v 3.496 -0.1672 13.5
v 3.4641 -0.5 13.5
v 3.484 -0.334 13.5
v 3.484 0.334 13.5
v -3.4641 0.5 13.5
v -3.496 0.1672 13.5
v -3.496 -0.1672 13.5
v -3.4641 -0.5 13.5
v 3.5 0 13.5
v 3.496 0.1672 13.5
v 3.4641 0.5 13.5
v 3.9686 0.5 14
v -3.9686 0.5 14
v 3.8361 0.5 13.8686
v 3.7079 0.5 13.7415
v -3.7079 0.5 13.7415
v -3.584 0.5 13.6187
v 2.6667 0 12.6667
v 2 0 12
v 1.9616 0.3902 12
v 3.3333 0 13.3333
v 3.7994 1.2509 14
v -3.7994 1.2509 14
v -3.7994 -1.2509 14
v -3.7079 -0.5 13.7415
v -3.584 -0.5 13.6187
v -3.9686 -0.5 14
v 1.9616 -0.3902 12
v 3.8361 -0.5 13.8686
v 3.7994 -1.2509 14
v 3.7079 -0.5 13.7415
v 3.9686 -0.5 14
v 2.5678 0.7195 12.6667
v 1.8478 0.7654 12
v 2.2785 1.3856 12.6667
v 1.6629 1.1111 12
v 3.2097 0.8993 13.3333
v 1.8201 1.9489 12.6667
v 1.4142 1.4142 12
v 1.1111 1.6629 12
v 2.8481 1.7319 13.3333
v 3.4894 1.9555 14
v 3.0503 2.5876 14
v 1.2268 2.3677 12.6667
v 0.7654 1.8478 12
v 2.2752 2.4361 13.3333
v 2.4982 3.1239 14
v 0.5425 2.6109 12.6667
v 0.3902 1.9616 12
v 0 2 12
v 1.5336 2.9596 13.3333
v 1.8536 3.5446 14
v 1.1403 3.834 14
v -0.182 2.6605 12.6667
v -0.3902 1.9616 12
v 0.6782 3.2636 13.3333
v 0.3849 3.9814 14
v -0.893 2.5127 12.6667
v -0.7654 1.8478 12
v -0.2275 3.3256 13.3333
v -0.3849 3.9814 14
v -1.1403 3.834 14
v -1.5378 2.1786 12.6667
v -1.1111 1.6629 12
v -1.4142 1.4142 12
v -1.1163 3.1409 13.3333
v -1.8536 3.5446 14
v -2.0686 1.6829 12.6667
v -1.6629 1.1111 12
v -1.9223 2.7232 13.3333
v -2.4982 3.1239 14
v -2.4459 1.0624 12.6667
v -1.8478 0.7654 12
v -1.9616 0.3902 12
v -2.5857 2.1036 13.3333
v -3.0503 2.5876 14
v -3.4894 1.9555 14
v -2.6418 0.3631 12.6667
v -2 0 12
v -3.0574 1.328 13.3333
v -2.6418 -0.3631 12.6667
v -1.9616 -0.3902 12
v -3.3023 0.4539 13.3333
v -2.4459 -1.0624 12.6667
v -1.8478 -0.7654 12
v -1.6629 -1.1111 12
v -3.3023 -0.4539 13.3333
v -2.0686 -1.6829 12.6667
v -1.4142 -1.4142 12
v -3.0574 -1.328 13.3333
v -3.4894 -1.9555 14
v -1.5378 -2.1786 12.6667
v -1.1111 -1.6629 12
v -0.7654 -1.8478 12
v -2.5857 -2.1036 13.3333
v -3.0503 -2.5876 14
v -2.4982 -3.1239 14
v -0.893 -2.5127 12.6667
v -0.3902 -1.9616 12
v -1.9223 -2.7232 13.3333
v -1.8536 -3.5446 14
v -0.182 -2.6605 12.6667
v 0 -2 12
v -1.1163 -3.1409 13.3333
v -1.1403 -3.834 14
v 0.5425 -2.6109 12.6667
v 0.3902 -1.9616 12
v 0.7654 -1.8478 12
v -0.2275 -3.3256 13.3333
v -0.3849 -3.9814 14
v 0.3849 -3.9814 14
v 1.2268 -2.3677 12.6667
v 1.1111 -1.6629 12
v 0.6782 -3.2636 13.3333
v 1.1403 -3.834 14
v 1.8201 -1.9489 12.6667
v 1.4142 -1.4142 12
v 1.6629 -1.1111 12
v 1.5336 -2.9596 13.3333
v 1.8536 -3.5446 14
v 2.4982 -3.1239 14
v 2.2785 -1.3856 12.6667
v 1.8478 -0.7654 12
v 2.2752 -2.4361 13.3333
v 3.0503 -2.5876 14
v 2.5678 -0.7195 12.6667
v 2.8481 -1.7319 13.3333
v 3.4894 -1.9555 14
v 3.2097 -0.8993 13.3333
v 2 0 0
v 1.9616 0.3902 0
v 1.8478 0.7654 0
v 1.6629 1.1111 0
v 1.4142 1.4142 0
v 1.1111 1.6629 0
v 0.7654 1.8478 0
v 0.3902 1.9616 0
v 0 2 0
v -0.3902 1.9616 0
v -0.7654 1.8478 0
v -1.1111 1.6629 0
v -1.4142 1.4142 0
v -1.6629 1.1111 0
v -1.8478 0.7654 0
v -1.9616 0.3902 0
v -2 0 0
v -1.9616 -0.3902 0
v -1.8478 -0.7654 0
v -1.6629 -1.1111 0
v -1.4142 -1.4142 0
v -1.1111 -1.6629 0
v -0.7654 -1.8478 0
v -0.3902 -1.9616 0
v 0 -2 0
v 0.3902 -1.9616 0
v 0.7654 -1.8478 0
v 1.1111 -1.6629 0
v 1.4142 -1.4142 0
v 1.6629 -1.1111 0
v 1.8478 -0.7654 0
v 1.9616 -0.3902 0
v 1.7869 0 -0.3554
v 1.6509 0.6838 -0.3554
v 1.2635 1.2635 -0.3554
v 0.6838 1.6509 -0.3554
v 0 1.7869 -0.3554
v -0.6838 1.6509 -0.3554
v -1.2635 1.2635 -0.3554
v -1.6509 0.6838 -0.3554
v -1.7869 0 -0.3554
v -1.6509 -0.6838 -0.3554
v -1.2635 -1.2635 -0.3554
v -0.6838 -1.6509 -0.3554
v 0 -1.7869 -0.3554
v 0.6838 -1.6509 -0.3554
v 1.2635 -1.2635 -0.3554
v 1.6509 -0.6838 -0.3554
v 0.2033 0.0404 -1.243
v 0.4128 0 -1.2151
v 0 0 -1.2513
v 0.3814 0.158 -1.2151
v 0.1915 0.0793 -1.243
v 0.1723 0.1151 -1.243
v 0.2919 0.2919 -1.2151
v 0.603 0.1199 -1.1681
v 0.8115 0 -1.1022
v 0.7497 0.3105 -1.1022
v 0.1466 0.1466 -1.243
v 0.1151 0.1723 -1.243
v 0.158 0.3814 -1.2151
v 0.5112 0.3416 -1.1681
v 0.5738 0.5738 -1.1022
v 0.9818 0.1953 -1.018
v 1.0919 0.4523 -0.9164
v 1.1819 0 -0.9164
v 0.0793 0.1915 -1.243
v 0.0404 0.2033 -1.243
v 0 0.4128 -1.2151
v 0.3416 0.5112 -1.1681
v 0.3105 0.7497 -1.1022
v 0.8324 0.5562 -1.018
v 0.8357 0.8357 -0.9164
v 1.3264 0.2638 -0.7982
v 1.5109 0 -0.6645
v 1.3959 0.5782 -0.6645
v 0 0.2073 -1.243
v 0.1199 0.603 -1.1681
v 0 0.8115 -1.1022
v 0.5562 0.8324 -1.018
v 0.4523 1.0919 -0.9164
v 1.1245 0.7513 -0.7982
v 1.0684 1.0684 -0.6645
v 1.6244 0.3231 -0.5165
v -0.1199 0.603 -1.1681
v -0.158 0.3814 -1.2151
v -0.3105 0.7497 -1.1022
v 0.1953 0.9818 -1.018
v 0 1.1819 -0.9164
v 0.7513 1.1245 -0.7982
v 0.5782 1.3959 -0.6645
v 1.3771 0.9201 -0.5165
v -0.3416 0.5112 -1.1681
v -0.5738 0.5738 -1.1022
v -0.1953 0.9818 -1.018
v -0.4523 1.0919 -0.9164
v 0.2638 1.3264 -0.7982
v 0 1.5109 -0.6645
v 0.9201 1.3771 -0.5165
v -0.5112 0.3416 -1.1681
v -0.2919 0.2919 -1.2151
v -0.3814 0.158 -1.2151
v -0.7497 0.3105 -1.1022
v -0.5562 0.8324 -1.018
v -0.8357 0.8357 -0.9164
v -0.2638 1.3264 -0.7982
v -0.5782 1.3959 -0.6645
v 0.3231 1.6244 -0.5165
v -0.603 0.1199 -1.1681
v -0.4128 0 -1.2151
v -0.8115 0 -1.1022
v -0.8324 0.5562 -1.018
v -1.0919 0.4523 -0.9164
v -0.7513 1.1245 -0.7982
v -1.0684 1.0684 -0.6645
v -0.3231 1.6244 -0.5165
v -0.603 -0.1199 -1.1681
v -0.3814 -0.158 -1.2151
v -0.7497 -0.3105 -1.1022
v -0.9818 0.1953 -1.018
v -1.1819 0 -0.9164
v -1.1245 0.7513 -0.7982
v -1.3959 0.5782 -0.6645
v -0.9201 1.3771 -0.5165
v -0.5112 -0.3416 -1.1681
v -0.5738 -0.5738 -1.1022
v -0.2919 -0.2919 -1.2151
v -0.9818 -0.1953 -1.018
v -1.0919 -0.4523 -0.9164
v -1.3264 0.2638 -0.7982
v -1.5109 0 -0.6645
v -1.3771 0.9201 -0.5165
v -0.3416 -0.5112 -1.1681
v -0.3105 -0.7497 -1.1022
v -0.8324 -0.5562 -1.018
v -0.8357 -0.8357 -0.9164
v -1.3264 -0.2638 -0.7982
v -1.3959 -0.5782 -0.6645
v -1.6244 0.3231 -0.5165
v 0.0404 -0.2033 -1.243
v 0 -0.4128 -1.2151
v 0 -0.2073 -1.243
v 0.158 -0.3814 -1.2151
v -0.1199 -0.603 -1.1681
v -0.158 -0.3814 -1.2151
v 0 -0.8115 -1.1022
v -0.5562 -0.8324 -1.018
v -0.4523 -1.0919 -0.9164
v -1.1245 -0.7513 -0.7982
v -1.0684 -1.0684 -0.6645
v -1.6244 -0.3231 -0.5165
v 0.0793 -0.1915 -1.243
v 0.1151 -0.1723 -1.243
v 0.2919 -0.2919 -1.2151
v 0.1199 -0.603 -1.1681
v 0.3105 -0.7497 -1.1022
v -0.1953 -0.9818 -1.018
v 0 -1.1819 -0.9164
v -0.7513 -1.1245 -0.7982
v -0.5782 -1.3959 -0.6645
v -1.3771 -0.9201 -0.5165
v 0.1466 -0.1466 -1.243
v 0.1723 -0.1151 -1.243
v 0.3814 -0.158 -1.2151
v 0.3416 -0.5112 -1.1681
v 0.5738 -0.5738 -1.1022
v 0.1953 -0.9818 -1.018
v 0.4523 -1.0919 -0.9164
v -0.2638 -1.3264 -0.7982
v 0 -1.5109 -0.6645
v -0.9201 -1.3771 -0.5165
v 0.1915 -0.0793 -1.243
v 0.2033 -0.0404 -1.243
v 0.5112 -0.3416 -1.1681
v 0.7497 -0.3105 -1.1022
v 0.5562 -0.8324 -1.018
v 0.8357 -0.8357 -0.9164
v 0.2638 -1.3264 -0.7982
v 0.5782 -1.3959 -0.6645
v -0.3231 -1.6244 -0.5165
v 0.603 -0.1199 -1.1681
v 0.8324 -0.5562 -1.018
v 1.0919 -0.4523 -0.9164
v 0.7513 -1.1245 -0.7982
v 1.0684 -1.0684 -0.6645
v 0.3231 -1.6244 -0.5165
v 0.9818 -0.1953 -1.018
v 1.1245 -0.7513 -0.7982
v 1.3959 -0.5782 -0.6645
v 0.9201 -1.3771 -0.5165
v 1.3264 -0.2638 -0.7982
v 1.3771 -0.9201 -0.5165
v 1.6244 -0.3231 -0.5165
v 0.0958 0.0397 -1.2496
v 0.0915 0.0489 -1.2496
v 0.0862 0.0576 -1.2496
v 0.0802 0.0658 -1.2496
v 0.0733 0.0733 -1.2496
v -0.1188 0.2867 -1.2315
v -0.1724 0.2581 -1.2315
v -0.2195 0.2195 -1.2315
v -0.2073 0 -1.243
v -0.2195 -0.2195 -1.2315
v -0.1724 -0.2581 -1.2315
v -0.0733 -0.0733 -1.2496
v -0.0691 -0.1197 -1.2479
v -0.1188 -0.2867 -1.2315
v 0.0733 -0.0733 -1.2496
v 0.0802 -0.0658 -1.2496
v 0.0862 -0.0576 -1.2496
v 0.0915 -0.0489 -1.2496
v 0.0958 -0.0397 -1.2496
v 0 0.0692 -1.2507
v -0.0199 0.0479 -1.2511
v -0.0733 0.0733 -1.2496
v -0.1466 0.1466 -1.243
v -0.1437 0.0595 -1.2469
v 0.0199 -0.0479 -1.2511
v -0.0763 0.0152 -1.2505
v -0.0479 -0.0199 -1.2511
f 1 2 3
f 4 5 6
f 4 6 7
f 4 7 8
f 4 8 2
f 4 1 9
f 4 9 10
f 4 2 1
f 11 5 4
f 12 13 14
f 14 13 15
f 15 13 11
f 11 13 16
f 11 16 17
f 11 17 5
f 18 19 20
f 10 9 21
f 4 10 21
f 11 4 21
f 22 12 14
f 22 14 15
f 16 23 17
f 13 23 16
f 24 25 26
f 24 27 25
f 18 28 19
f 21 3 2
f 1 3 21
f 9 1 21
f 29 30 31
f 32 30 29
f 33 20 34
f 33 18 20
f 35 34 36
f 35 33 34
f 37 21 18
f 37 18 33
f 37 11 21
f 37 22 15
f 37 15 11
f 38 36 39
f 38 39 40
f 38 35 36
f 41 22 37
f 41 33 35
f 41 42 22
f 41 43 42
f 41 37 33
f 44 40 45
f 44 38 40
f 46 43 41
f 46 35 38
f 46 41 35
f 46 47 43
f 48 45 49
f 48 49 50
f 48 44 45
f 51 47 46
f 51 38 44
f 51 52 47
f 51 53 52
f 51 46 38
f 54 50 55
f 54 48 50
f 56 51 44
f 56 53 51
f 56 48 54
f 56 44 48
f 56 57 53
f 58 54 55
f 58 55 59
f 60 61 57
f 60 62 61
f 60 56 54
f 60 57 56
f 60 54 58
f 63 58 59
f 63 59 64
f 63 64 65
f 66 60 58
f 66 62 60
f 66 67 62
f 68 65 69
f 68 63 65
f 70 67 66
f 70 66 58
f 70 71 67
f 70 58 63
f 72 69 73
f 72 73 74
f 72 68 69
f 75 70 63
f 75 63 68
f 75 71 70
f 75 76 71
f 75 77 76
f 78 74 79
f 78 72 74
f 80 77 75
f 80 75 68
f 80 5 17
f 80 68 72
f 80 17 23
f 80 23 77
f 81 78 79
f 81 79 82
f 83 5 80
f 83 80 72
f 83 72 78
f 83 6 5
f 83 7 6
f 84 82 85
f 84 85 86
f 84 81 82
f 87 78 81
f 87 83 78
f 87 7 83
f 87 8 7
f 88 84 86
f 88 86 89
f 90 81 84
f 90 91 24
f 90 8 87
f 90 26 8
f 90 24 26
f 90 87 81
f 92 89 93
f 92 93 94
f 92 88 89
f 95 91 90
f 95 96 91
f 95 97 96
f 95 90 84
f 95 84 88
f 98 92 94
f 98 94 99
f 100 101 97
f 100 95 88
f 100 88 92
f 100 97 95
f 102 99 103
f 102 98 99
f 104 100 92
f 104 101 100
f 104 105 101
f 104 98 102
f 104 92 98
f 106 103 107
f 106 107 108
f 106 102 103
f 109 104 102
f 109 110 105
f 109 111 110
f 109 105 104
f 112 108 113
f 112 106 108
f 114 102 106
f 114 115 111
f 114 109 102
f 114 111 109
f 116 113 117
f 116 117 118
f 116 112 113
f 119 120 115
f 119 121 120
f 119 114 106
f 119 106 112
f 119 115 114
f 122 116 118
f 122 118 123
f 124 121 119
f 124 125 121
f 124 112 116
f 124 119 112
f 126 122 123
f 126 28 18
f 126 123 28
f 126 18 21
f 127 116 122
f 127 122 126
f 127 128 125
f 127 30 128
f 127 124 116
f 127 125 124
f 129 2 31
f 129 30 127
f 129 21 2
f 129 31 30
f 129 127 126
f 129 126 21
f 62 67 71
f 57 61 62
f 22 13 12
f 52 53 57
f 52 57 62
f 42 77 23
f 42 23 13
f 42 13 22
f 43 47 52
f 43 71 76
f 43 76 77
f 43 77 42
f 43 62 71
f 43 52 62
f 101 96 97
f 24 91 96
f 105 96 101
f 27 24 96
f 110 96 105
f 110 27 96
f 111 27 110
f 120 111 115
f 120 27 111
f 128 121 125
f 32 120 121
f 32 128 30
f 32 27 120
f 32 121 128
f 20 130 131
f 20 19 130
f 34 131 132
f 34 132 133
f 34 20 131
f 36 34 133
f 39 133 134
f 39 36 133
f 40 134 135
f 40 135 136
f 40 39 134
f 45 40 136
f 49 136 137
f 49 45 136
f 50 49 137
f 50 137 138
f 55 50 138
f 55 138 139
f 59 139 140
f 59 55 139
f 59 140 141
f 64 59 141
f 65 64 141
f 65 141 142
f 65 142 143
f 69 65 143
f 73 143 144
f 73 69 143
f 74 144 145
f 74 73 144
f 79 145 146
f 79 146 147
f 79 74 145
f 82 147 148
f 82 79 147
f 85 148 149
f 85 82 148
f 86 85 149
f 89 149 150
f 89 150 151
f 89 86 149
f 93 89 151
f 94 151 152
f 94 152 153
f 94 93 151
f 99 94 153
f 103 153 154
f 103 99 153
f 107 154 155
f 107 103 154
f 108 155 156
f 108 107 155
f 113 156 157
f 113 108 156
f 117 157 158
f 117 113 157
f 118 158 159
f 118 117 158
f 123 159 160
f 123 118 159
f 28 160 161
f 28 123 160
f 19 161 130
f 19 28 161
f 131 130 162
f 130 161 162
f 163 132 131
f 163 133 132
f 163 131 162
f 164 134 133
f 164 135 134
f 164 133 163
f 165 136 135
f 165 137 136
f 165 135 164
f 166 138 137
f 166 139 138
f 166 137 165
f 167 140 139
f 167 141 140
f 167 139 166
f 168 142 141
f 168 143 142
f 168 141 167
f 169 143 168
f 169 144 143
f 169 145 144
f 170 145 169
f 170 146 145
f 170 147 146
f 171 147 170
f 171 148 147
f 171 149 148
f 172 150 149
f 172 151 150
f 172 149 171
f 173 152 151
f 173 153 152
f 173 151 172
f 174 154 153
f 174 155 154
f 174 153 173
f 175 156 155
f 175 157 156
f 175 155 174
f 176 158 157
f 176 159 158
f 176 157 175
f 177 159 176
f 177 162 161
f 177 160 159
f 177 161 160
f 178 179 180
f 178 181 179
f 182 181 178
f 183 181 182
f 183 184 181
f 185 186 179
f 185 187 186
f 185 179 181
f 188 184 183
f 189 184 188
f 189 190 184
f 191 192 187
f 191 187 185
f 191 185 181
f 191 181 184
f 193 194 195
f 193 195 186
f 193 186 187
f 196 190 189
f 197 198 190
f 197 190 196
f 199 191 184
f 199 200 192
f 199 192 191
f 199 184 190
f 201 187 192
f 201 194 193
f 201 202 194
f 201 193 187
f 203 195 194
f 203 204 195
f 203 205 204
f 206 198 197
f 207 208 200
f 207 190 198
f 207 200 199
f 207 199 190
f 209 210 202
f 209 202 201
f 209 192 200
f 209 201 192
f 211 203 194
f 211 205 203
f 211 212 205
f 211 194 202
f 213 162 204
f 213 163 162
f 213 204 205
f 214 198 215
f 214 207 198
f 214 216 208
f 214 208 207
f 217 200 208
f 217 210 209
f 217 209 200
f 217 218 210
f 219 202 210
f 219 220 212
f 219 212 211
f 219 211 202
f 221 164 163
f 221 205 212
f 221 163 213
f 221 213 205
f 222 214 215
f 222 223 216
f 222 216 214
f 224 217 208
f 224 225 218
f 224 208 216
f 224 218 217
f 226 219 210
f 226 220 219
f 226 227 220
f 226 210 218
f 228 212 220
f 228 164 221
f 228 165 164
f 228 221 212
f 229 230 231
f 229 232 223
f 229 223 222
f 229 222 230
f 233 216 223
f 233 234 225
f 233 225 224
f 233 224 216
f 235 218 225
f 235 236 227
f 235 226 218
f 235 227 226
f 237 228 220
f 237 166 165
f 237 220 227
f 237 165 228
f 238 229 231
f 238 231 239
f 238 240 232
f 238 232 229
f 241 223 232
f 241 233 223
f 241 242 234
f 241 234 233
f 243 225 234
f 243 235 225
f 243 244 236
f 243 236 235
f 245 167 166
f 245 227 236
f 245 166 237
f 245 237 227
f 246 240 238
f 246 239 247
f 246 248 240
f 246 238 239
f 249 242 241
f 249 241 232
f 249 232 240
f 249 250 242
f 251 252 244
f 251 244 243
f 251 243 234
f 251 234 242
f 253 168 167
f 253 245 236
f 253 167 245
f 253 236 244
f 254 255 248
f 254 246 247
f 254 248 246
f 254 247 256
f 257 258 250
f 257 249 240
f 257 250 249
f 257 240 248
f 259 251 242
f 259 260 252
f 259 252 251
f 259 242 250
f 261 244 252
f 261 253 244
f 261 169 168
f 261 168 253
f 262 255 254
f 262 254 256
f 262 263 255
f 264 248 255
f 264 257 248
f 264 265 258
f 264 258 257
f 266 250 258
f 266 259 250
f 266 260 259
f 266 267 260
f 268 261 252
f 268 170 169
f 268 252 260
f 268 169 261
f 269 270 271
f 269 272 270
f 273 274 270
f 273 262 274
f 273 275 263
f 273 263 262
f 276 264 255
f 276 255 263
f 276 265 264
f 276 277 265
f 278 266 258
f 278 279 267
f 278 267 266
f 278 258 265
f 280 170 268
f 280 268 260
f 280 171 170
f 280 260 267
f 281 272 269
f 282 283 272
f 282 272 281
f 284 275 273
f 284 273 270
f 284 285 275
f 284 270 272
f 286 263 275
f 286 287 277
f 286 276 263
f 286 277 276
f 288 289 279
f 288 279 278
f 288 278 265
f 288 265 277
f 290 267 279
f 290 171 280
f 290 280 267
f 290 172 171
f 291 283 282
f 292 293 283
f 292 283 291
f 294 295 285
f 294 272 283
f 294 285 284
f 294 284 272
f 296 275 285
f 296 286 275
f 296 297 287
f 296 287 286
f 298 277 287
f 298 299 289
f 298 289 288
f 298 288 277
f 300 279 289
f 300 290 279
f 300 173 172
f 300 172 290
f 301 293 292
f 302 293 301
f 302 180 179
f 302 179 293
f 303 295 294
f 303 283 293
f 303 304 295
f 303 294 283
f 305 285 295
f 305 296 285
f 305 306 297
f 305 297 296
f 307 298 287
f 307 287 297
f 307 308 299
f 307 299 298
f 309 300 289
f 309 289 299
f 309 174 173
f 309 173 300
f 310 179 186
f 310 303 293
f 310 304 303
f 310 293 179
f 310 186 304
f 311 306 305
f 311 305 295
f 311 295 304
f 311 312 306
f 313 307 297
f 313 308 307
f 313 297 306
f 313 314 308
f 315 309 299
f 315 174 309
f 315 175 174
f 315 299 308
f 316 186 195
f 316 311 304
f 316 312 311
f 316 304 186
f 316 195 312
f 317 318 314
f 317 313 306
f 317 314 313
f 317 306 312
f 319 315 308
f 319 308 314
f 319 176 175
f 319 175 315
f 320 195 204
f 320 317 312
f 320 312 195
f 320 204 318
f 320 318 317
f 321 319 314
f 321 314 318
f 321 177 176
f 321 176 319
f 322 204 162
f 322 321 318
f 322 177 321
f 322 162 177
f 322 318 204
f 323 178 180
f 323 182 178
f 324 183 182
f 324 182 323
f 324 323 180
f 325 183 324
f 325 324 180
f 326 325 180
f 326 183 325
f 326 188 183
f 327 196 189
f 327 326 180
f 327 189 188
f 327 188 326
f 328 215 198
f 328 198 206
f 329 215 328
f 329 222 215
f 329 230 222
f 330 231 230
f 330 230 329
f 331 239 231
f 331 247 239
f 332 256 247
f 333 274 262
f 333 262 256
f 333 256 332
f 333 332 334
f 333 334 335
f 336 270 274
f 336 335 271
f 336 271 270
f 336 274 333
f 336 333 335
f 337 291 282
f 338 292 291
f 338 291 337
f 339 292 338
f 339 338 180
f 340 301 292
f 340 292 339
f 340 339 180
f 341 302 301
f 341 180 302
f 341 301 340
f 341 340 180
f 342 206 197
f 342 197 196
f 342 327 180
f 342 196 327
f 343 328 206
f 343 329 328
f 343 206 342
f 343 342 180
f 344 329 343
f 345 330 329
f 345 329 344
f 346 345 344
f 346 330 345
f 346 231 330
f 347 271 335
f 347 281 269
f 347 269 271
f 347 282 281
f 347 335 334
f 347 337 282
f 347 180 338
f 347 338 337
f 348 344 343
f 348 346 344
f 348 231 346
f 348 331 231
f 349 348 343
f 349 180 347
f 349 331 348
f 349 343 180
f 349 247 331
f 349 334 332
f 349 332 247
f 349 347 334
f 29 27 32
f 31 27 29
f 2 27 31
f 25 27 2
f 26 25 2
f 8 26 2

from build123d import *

# Parameters (mm, degrees)
F2_W     = 10.128174
F2_H     = 1
F3_DEPTH = 0.5


with BuildPart() as f1:
    # F0 (on Front) → F1 (revolve)
    with BuildSketch(Plane.XZ):
        with BuildLine():
            Line((0, 14), (0, 0))
            Line((0, 0), (0, -1.251342))
            ThreePointArc((0, -1.251342), (1.181918, -0.916427), (2, 0))
            Line((2, 0), (2, 12))
            Line((2, 12), (4, 14))
            Line((4, 14), (0, 14))
        make_face()
    revolve(axis=Axis((0, 0, 7), (0, 0, 1)))

    # F2 (on face) → F3 (cut)
    with BuildSketch(Plane.XY.offset(14)):
        Rectangle(F2_W, F2_H)
    extrude(amount=-F3_DEPTH, mode=Mode.SUBTRACT)


solid = f1.part
